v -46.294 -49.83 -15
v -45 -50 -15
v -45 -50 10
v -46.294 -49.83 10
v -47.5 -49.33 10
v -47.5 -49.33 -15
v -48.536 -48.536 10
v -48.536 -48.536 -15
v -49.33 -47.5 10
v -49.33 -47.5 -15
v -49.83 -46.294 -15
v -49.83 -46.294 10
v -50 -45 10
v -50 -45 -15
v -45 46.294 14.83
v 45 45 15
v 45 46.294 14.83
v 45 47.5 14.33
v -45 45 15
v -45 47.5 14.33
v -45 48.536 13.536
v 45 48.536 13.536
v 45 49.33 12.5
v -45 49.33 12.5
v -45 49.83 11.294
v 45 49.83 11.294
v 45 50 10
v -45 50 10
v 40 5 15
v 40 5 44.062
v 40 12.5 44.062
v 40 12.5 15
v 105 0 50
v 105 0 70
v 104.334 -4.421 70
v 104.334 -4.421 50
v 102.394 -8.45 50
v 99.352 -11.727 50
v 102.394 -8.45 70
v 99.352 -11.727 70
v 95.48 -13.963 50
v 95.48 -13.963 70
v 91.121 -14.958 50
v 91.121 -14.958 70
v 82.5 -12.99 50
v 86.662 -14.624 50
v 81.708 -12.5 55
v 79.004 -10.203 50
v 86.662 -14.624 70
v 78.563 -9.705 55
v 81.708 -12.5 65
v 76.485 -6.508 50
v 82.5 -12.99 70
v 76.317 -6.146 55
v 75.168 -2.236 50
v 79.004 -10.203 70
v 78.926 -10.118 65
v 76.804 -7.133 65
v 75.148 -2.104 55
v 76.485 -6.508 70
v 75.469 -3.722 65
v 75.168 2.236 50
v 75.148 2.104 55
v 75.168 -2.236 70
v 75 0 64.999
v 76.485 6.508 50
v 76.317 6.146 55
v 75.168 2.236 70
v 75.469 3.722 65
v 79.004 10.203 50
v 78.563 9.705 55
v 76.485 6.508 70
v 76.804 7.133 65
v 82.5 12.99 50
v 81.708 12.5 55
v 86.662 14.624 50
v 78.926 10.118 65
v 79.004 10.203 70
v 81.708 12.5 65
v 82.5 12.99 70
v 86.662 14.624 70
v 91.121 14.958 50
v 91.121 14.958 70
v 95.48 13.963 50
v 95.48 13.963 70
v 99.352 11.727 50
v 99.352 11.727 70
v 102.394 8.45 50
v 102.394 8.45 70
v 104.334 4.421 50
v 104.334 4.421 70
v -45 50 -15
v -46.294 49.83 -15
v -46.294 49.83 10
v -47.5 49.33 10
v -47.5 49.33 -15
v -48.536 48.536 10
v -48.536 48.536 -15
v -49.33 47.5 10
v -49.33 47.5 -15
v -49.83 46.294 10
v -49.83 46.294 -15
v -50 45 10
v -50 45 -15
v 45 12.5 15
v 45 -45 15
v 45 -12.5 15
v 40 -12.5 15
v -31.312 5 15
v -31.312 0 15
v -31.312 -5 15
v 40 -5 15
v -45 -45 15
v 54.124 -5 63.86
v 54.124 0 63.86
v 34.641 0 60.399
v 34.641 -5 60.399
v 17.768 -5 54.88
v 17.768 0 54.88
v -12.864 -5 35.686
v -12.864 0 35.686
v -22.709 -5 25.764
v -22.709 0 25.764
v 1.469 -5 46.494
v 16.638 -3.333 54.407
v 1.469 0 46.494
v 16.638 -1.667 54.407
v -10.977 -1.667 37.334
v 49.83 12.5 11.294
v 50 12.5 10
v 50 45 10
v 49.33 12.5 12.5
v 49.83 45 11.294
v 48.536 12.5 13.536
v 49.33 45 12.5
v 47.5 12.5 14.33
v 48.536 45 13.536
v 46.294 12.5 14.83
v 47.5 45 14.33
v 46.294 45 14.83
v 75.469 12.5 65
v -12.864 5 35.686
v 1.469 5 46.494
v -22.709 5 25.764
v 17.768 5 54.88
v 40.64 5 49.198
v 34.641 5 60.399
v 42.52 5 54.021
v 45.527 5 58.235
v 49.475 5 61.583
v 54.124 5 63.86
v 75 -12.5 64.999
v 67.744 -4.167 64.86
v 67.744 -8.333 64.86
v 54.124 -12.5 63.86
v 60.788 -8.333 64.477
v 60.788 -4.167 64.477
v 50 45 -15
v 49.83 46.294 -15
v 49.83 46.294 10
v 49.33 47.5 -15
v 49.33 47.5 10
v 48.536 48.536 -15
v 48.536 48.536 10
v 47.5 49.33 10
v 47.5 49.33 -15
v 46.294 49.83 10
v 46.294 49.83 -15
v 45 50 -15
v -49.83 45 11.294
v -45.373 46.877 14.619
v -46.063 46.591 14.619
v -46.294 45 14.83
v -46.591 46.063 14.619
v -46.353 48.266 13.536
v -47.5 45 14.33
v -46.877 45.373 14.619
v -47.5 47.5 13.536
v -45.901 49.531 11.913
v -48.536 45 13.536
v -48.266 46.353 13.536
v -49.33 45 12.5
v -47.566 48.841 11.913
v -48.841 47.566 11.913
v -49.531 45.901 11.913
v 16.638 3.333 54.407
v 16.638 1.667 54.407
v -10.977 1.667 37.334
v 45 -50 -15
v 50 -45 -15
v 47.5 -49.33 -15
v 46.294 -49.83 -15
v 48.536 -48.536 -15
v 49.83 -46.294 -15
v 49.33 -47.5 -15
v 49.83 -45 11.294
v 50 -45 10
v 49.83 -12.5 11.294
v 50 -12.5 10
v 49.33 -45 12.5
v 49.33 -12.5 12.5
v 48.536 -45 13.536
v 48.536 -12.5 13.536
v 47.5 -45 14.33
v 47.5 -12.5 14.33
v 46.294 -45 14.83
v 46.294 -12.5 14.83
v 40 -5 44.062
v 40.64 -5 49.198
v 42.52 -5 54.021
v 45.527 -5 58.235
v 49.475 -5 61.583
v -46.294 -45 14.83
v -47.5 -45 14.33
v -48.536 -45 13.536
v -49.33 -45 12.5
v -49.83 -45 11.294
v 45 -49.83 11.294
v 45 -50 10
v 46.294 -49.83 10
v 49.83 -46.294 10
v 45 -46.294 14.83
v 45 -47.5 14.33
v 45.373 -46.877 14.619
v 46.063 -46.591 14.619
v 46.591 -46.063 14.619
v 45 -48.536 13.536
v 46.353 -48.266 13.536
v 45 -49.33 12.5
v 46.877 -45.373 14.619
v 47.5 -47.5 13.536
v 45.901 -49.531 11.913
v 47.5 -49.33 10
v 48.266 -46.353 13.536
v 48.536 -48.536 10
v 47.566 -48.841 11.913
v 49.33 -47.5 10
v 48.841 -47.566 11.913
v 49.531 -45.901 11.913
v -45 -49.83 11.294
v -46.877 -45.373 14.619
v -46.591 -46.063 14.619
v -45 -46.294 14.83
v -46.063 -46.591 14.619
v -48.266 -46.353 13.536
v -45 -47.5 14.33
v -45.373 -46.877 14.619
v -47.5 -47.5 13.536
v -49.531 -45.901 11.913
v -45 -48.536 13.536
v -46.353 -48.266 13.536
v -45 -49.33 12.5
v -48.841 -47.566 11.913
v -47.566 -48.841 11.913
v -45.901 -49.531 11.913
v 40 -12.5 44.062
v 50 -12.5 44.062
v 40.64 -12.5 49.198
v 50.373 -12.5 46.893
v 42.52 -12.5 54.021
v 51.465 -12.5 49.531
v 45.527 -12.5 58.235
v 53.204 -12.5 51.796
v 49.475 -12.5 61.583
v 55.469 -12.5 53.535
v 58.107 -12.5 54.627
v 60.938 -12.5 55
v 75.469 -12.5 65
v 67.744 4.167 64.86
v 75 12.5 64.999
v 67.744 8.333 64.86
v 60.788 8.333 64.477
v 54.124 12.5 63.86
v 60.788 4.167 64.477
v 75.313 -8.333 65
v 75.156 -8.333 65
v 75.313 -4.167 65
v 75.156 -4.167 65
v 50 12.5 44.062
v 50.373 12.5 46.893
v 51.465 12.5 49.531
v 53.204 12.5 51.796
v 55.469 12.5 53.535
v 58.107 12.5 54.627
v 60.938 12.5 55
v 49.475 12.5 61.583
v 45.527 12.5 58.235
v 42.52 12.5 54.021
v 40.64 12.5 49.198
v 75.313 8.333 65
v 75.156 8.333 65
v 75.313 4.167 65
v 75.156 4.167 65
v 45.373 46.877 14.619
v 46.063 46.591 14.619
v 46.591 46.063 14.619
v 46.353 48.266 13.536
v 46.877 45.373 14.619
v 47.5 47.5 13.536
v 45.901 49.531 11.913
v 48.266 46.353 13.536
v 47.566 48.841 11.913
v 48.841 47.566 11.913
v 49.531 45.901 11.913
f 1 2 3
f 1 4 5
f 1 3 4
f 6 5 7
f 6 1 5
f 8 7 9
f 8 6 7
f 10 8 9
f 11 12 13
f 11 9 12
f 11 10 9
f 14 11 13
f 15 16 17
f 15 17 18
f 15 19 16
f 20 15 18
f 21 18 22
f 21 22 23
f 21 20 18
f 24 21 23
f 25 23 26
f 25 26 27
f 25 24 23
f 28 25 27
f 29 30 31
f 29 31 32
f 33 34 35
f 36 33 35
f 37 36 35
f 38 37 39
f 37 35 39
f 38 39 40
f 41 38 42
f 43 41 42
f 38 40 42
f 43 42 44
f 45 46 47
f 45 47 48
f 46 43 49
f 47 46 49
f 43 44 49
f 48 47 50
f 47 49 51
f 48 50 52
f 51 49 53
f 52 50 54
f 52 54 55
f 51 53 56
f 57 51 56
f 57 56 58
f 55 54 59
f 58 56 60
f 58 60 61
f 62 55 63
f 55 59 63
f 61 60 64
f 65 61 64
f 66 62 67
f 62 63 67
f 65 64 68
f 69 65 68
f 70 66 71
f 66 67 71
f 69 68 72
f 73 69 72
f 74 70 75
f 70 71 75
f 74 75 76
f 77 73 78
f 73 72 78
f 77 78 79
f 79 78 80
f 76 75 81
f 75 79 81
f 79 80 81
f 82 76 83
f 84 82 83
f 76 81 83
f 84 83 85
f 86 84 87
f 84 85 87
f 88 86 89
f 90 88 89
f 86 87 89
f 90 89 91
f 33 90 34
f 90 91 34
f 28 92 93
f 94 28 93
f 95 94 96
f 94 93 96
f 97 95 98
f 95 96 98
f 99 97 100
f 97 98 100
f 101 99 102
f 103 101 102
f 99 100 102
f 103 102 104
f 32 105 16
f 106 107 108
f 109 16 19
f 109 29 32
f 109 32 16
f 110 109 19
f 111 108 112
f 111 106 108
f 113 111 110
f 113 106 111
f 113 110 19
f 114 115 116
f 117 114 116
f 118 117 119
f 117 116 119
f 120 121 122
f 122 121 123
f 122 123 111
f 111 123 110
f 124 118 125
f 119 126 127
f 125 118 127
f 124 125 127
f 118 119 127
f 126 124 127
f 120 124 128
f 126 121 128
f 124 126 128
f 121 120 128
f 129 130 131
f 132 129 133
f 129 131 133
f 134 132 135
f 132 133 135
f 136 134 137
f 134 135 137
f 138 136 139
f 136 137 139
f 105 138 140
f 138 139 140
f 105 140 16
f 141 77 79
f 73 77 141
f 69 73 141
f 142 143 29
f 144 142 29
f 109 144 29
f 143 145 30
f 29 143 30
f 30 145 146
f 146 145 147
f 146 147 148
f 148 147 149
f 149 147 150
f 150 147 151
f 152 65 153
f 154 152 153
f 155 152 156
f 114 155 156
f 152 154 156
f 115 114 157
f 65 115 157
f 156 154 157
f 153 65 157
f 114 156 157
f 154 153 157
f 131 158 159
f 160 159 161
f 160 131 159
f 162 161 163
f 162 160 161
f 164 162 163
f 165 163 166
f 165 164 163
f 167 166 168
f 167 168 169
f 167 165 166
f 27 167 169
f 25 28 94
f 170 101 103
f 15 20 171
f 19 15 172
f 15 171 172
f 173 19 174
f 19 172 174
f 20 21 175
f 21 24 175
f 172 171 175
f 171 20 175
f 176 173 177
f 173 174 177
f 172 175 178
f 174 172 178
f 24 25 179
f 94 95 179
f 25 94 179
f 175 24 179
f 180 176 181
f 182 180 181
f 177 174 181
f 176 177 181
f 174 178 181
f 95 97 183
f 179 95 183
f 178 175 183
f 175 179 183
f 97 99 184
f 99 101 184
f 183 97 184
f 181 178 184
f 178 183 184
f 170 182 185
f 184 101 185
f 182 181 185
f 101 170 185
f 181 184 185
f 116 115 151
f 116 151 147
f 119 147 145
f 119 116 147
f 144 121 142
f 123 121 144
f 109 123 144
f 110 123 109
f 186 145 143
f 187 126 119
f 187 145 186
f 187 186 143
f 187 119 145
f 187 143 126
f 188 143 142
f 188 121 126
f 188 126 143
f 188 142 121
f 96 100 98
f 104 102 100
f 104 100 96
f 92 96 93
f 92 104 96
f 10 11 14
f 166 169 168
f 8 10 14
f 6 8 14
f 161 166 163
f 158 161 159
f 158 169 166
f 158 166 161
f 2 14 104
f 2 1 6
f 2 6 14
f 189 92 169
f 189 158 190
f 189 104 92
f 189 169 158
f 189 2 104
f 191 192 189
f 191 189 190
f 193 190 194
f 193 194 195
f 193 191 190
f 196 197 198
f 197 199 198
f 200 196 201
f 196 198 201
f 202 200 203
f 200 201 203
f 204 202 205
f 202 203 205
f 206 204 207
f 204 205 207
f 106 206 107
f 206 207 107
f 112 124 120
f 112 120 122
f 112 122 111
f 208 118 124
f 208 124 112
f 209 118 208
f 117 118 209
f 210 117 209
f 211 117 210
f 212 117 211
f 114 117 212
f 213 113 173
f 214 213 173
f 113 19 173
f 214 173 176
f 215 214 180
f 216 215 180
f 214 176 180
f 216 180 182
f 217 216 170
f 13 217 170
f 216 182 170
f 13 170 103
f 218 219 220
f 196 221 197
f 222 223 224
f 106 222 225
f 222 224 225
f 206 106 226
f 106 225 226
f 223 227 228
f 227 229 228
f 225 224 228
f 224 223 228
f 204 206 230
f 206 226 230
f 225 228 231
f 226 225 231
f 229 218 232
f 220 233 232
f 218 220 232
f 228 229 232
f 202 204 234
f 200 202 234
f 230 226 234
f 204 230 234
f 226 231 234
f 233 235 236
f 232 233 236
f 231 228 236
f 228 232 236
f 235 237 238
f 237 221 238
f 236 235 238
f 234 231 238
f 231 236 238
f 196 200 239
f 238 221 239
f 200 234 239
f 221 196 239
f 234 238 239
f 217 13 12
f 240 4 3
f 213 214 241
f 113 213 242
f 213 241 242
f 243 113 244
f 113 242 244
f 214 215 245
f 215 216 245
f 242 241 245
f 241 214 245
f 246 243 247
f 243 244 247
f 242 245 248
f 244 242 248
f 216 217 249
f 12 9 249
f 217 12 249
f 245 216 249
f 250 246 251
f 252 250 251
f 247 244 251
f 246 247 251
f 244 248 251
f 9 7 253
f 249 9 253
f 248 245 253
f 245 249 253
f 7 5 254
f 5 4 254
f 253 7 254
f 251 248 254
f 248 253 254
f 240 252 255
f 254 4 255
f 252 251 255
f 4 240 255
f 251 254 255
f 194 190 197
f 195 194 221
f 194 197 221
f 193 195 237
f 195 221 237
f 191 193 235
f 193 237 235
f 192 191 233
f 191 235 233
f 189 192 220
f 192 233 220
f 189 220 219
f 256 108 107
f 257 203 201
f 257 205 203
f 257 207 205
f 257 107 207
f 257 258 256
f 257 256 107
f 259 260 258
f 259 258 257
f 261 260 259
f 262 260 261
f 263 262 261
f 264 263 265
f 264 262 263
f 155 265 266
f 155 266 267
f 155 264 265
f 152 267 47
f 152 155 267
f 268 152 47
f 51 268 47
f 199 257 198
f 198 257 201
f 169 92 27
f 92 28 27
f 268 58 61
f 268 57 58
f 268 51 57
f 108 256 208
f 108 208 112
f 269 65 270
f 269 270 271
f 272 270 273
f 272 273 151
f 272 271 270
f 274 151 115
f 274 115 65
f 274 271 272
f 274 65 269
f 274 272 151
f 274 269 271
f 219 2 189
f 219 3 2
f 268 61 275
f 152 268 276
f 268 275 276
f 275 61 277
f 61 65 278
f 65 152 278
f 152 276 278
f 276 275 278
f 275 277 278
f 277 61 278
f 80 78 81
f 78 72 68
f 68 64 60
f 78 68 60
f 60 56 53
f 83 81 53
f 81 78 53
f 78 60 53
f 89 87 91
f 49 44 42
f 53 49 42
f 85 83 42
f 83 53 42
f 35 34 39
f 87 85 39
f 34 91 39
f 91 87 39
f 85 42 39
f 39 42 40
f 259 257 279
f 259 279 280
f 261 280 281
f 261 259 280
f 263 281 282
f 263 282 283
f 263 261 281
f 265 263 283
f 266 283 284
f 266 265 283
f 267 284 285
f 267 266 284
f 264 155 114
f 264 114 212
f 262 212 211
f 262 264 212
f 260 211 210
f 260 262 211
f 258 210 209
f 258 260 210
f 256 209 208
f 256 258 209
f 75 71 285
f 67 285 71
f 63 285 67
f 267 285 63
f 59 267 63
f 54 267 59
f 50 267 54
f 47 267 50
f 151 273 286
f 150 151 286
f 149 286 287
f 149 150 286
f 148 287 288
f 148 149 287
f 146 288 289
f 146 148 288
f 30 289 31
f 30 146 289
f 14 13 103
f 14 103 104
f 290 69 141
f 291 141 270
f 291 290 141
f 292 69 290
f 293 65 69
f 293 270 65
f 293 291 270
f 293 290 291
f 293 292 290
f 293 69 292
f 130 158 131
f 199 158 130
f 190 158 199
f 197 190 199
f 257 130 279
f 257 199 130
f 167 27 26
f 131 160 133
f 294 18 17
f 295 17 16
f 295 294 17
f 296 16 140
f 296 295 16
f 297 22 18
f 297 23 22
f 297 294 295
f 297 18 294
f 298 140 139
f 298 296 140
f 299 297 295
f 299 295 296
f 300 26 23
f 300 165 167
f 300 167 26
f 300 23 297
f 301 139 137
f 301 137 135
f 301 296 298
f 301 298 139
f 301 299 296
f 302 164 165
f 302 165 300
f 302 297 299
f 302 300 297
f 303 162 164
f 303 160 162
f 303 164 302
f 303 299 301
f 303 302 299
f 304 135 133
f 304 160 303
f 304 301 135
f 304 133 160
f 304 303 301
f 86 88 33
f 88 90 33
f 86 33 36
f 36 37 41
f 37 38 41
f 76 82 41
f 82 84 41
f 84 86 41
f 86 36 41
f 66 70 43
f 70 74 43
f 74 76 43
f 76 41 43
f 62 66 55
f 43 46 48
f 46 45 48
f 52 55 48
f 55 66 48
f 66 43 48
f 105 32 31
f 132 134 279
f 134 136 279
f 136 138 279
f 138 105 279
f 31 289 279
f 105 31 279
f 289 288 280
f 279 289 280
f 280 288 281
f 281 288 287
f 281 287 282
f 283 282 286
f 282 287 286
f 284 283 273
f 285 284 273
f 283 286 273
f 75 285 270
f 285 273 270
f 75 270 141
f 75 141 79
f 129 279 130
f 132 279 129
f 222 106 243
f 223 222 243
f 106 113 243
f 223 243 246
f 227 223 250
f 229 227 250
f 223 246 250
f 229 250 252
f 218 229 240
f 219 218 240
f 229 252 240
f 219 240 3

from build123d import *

# Parameters (mm, degrees)
F1_DEPTH = 50
F2_DEPTH = 12.5
F3_DEPTH = 5
F5_R     = 5


with BuildPart() as f1:
    # F0 (on Front) → F1 (new body, symmetric)
    with BuildSketch(Plane.XZ):
        Polygon((-31.3122831285, 15), (-50, 15), (-50, -15), (50, -15), (50, 15), (40, 15), align=None)
    extrude(amount=F1_DEPTH, both=True)

    # F0 (on Front) → F2 (join, symmetric)
    with BuildSketch(Plane.XZ):
        with BuildLine():
            Line((40, 44.0615866161), (40, 15))
            Line((40, 15), (50, 15))
            Line((50, 15), (50, 44.0615866161))
            ThreePointArc((50, 44.0615866161), (53.2037871047, 51.7962128953), (60.9384133839, 55))
            Line((60.9384133839, 55), (75, 55))
            Line((75, 55), (75, 64.9994979734))
            add(Edge.make_bspline(
                [(75, 64.9994979734), (67.590366239, 64.98362656), (60.6448722372, 64.59168303), (54.1236525971, 63.8599751984)],
                knots=[0.3245366314, 0.3245366314, 0.3245366314, 0.3245366314, 15.7199359846, 15.7199359846, 15.7199359846, 15.7199359846], degree=3))
            ThreePointArc((54.1236525971, 63.8599751984), (43.8927770875, 56.2214977294), (40, 44.0615866161))
        make_face()
        with BuildLine():
            add(Edge.make_bspline(
                [(75.469206692, 65), (75.3125979622, 65), (75.156195856, 64.9998325444), (75, 64.9994979734)],
                knots=[0, 0, 0, 0, 0.3245366314, 0.3245366314, 0.3245366314, 0.3245366314], degree=3))
            Line((75, 64.9994979734), (75, 55))
            Line((75, 55), (90, 55))
            Line((90, 55), (90, 65))
            Line((90, 65), (75.469206692, 65))
        make_face()
    extrude(amount=F2_DEPTH, both=True)

    # F0 (on Front) → F3 (join, symmetric)
    with BuildSketch(Plane.XZ):
        with BuildLine():
            add(Edge.make_bspline(
                [(54.1236525971, 63.8599751984), (10.8386087283, 59.0032141413), (-13.7540441275, 39.1773487702), (-31.3122831285, 15)],
                knots=[15.7199359846, 15.7199359846, 15.7199359846, 15.7199359846, 117.9079580362, 117.9079580362, 117.9079580362, 117.9079580362], degree=3))
            Line((-31.3122831285, 15), (40, 15))
            Line((40, 15), (40, 44.0615866161))
            ThreePointArc((40, 44.0615866161), (43.8927770875, 56.2214977294), (54.1236525971, 63.8599751984))
        make_face()
    extrude(amount=F3_DEPTH, both=True)

    # F0 (on Front) → F4 (revolve)
    with BuildSketch(Plane.XZ):
        Polygon((90, 65), (90, 55), (90, 50), (105, 50), (105, 70), (90, 70), align=None)
    revolve(axis=Axis((90, 0, 60), (0, 0, -1)))

    # F5
    f5_edges = [f1.edges().sort_by_distance(p)[0] for p in [
        (50, -50, 0),
        (-50, -50, 0),
        (50, 50, 0),
        (-50, 50, 0),
        (0, 50, 15),
        (-50, 0, 15),
        (0, -50, 15),
        (50, -31.25, 15),
        (50, 31.25, 15),
    ]]
    fillet(f5_edges, radius=F5_R)


solid = f1.part
